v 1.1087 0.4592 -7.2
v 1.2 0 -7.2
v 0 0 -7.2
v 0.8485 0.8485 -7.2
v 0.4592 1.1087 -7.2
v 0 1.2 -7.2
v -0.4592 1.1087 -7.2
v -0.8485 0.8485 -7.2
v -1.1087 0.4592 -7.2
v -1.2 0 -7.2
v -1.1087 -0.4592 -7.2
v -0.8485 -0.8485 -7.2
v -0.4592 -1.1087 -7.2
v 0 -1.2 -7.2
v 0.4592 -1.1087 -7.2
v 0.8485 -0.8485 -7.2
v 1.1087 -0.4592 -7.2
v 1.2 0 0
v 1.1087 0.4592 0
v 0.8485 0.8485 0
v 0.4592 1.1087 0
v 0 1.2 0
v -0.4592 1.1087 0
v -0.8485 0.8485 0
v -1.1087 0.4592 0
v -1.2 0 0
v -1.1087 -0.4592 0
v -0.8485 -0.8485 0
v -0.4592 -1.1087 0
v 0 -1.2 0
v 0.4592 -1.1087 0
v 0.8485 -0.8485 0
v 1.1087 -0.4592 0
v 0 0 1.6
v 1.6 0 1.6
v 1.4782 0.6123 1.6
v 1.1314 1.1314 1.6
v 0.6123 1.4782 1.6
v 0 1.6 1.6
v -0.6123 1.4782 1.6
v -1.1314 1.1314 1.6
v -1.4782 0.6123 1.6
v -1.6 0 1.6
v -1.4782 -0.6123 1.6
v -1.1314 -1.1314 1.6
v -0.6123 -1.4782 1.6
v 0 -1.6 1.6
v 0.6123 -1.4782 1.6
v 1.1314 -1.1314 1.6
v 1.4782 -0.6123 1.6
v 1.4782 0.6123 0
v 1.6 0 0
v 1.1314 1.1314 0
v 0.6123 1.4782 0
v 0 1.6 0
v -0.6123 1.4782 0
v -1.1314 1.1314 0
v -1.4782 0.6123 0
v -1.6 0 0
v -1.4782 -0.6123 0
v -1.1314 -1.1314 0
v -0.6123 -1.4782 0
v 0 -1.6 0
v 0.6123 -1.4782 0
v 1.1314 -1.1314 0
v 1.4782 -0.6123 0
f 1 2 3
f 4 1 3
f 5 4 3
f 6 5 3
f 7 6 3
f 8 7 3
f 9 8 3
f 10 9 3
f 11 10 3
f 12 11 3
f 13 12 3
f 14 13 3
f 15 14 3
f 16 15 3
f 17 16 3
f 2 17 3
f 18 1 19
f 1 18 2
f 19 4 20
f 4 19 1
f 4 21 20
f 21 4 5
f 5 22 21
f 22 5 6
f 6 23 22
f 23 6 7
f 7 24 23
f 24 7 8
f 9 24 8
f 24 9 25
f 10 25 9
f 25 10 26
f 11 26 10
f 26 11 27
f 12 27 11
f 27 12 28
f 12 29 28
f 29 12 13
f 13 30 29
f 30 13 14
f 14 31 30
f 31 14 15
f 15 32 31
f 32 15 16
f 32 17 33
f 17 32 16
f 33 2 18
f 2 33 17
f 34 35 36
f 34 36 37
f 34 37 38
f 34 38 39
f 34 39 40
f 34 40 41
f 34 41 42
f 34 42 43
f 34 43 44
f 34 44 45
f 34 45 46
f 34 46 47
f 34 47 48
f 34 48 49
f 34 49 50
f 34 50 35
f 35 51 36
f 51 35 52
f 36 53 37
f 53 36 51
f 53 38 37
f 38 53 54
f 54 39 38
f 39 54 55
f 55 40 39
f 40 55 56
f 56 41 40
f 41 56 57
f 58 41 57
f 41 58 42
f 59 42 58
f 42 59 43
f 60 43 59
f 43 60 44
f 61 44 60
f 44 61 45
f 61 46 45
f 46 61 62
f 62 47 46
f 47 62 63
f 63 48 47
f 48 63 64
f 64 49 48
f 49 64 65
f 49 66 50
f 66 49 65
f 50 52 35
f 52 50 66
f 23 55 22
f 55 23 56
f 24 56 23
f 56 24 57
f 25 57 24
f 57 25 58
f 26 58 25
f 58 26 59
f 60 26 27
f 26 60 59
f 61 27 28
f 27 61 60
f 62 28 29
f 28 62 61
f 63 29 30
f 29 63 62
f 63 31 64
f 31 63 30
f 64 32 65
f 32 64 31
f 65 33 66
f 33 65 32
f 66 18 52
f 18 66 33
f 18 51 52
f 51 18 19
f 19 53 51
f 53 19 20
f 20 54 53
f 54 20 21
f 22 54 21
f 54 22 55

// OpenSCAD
// file: ../p/4-4edge.scad
use <../lib.scad>
function ldraw_lib__4_4edge() = [
// 0 Circle 1.0
// 0 Name: 4-4edge.dat
// 0 Author: James Jessiman
// 0 !LDRAW_ORG Primitive UPDATE 2017-01
// 0 !LICENSE Licensed under CC BY 2.0 and CC BY 4.0 : see CAreadme.txt
// 
// 0 BFC CERTIFY CCW
  [0,"BFC","CERTIFY"],
  [0,"BFC","CCW"],
// 
// 0 !HISTORY 1998-12-15 [PTadmin] Official Update 1998-10
// 0 !HISTORY 2005-12-28 [PTadmin] Official Update 2005-01
// 0 !HISTORY 2007-06-24 [PTadmin] Header formatted for Contributor Agreement
// 0 !HISTORY 2008-07-01 [PTadmin] Official Update 2008-01
// 0 !HISTORY 2017-01-15 [Steffen] BFCed
// 0 !HISTORY 2017-12-30 [PTadmin] Official Update 2017-01
// 
// 
// 2 24 1 0 0 0.9239 0 0.3827
  [2,24,1,0,0,0.9239,0,0.3827],
// 2 24 0.9239 0 0.3827 0.7071 0 0.7071
  [2,24,0.9239,0,0.3827,0.7071,0,0.7071],
// 2 24 0.7071 0 0.7071 0.3827 0 0.9239
  [2,24,0.7071,0,0.7071,0.3827,0,0.9239],
// 2 24 0.3827 0 0.9239 0 0 1
  [2,24,0.3827,0,0.9239,0,0,1],
// 2 24 0 0 1 -0.3827 0 0.9239
  [2,24,0,0,1,-0.3827,0,0.9239],
// 2 24 -0.3827 0 0.9239 -0.7071 0 0.7071
  [2,24,-0.3827,0,0.9239,-0.7071,0,0.7071],
// 2 24 -0.7071 0 0.7071 -0.9239 0 0.3827
  [2,24,-0.7071,0,0.7071,-0.9239,0,0.3827],
// 2 24 -0.9239 0 0.3827 -1 0 -0
  [2,24,-0.9239,0,0.3827,-1,0,-0],
// 2 24 -1 0 -0 -0.9239 0 -0.3827
  [2,24,-1,0,-0,-0.9239,0,-0.3827],
// 2 24 -0.9239 0 -0.3827 -0.7071 0 -0.7071
  [2,24,-0.9239,0,-0.3827,-0.7071,0,-0.7071],
// 2 24 -0.7071 0 -0.7071 -0.3827 0 -0.9239
  [2,24,-0.7071,0,-0.7071,-0.3827,0,-0.9239],
// 2 24 -0.3827 0 -0.9239 0 0 -1
  [2,24,-0.3827,0,-0.9239,0,0,-1],
// 2 24 0 0 -1 0.3827 0 -0.9239
  [2,24,0,0,-1,0.3827,0,-0.9239],
// 2 24 0.3827 0 -0.9239 0.7071 0 -0.7071
  [2,24,0.3827,0,-0.9239,0.7071,0,-0.7071],
// 2 24 0.7071 0 -0.7071 0.9239 0 -0.3827
  [2,24,0.7071,0,-0.7071,0.9239,0,-0.3827],
// 2 24 0.9239 0 -0.3827 1 0 0
  [2,24,0.9239,0,-0.3827,1,0,0],
];
makepoly(ldraw_lib__4_4edge(), line=0.2);
// file: ../p/4-4disc.scad
use <../lib.scad>
function ldraw_lib__4_4disc() = [
// 0 Disc 1.0
// 0 Name: 4-4disc.dat
// 0 Author: James Jessiman
// 0 !LDRAW_ORG Primitive UPDATE 2002-02
// 0 !LICENSE Licensed under CC BY 2.0 and CC BY 4.0 : see CAreadme.txt
// 
// 0 BFC CERTIFY CCW
  [0,"BFC","CERTIFY"],
  [0,"BFC","CCW"],
// 
// 0 !HISTORY 1998-12-15 [PTadmin] Official Update 1998-10
// 0 !HISTORY 2002-03-23 [sbliss] Added BFC statement
// 0 !HISTORY 2002-04-25 [PTadmin] Official Update 2002-02
// 0 !HISTORY 2007-06-24 [PTadmin] Header formatted for Contributor Agreement
// 0 !HISTORY 2008-07-01 [PTadmin] Official Update 2008-01
// 
// 
// 3 16 0 0 0 1 0 0 0.9239 0 0.3827
  [3,16,0,0,0,1,0,0,0.9239,0,0.3827],
// 3 16 0 0 0 0.9239 0 0.3827 0.7071 0 0.7071
  [3,16,0,0,0,0.9239,0,0.3827,0.7071,0,0.7071],
// 3 16 0 0 0 0.7071 0 0.7071 0.3827 0 0.9239
  [3,16,0,0,0,0.7071,0,0.7071,0.3827,0,0.9239],
// 3 16 0 0 0 0.3827 0 0.9239 0 0 1
  [3,16,0,0,0,0.3827,0,0.9239,0,0,1],
// 3 16 0 0 0 0 0 1 -0.3827 0 0.9239
  [3,16,0,0,0,0,0,1,-0.3827,0,0.9239],
// 3 16 0 0 0 -0.3827 0 0.9239 -0.7071 0 0.7071
  [3,16,0,0,0,-0.3827,0,0.9239,-0.7071,0,0.7071],
// 3 16 0 0 0 -0.7071 0 0.7071 -0.9239 0 0.3827
  [3,16,0,0,0,-0.7071,0,0.7071,-0.9239,0,0.3827],
// 3 16 0 0 0 -0.9239 0 0.3827 -1 0 -0
  [3,16,0,0,0,-0.9239,0,0.3827,-1,0,-0],
// 3 16 0 0 0 -1 0 -0 -0.9239 0 -0.3827
  [3,16,0,0,0,-1,0,-0,-0.9239,0,-0.3827],
// 3 16 0 0 0 -0.9239 0 -0.3827 -0.7071 0 -0.7071
  [3,16,0,0,0,-0.9239,0,-0.3827,-0.7071,0,-0.7071],
// 3 16 0 0 0 -0.7071 0 -0.7071 -0.3827 0 -0.9239
  [3,16,0,0,0,-0.7071,0,-0.7071,-0.3827,0,-0.9239],
// 3 16 0 0 0 -0.3827 0 -0.9239 0 0 -1
  [3,16,0,0,0,-0.3827,0,-0.9239,0,0,-1],
// 3 16 0 0 0 0 0 -1 0.3827 0 -0.9239
  [3,16,0,0,0,0,0,-1,0.3827,0,-0.9239],
// 3 16 0 0 0 0.3827 0 -0.9239 0.7071 0 -0.7071
  [3,16,0,0,0,0.3827,0,-0.9239,0.7071,0,-0.7071],
// 3 16 0 0 0 0.7071 0 -0.7071 0.9239 0 -0.3827
  [3,16,0,0,0,0.7071,0,-0.7071,0.9239,0,-0.3827],
// 3 16 0 0 0 0.9239 0 -0.3827 1 0 0
  [3,16,0,0,0,0.9239,0,-0.3827,1,0,0],
// 0
];
makepoly(ldraw_lib__4_4disc(), line=0.2);
// file: ../p/4-4cyli.scad
use <../lib.scad>
function ldraw_lib__4_4cyli() = [
// 0 Cylinder 1.0
// 0 Name: 4-4cyli.dat
// 0 Author: James Jessiman
// 0 !LDRAW_ORG Primitive UPDATE 2005-01
// 0 !LICENSE Licensed under CC BY 2.0 and CC BY 4.0 : see CAreadme.txt
// 
// 0 BFC CERTIFY CCW
  [0,"BFC","CERTIFY"],
  [0,"BFC","CCW"],
// 
// 0 !HISTORY 1998-12-15 [PTadmin] Official Update 1998-10
// 0 !HISTORY 2002-03-23 [sbliss] Added BFC statement; merged headers from files in distributions LDraw 0.27 and Complete.
// 0 !HISTORY 2002-04-25 [PTadmin] Official Update 2002-02
// 0 !HISTORY 2004-12-14 [guyvivan] BFC CCW
// 0 !HISTORY 2005-12-28 [PTadmin] Official Update 2005-01
// 0 !HISTORY 2007-06-24 [PTadmin] Header formatted for Contributor Agreement
// 0 !HISTORY 2008-07-01 [PTadmin] Official Update 2008-01
// 
// 
// 4 16 1 1 0 0.9239 1 0.3827 0.9239 0 0.3827 1 0 0
  [4,16,1,1,0,0.9239,1,0.3827,0.9239,0,0.3827,1,0,0],
// 5 24 1 0 0 1 1 0 0.9239 0 0.3827 0.9239 0 -0.3827
  [5,24,1,0,0,1,1,0,0.9239,0,0.3827,0.9239,0,-0.3827],
// 4 16 0.9239 1 0.3827 0.7071 1 0.7071 0.7071 0 0.7071 0.9239 0 0.3827
  [4,16,0.9239,1,0.3827,0.7071,1,0.7071,0.7071,0,0.7071,0.9239,0,0.3827],
// 5 24 0.9239 0 0.3827 0.9239 1 0.3827 0.7071 0 0.7071 1 0 0
  [5,24,0.9239,0,0.3827,0.9239,1,0.3827,0.7071,0,0.7071,1,0,0],
// 4 16 0.7071 1 0.7071 0.3827 1 0.9239 0.3827 0 0.9239 0.7071 0 0.7071
  [4,16,0.7071,1,0.7071,0.3827,1,0.9239,0.3827,0,0.9239,0.7071,0,0.7071],
// 5 24 0.7071 0 0.7071 0.7071 1 0.7071 0.3827 0 0.9239 0.9239 0 0.3827
  [5,24,0.7071,0,0.7071,0.7071,1,0.7071,0.3827,0,0.9239,0.9239,0,0.3827],
// 4 16 0.3827 1 0.9239 0 1 1 0 0 1 0.3827 0 0.9239
  [4,16,0.3827,1,0.9239,0,1,1,0,0,1,0.3827,0,0.9239],
// 5 24 0.3827 0 0.9239 0.3827 1 0.9239 0 0 1 0.7071 0 0.7071
  [5,24,0.3827,0,0.9239,0.3827,1,0.9239,0,0,1,0.7071,0,0.7071],
// 4 16 0 1 1 -0.3827 1 0.9239 -0.3827 0 0.9239 0 0 1
  [4,16,0,1,1,-0.3827,1,0.9239,-0.3827,0,0.9239,0,0,1],
// 5 24 0 0 1 0 1 1 -0.3827 0 0.9239 0.3827 0 0.9239
  [5,24,0,0,1,0,1,1,-0.3827,0,0.9239,0.3827,0,0.9239],
// 4 16 -0.3827 1 0.9239 -0.7071 1 0.7071 -0.7071 0 0.7071 -0.3827 0 0.9239
  [4,16,-0.3827,1,0.9239,-0.7071,1,0.7071,-0.7071,0,0.7071,-0.3827,0,0.9239],
// 5 24 -0.3827 0 0.9239 -0.3827 1 0.9239 -0.7071 0 0.7071 0 0 1
  [5,24,-0.3827,0,0.9239,-0.3827,1,0.9239,-0.7071,0,0.7071,0,0,1],
// 4 16 -0.7071 1 0.7071 -0.9239 1 0.3827 -0.9239 0 0.3827 -0.7071 0 0.7071
  [4,16,-0.7071,1,0.7071,-0.9239,1,0.3827,-0.9239,0,0.3827,-0.7071,0,0.7071],
// 5 24 -0.7071 0 0.7071 -0.7071 1 0.7071 -0.9239 0 0.3827 -0.3827 0 0.9239
  [5,24,-0.7071,0,0.7071,-0.7071,1,0.7071,-0.9239,0,0.3827,-0.3827,0,0.9239],
// 4 16 -0.9239 1 0.3827 -1 1 0 -1 0 0 -0.9239 0 0.3827
  [4,16,-0.9239,1,0.3827,-1,1,0,-1,0,0,-0.9239,0,0.3827],
// 5 24 -0.9239 0 0.3827 -0.9239 1 0.3827 -1 0 0 -0.7071 0 0.7071
  [5,24,-0.9239,0,0.3827,-0.9239,1,0.3827,-1,0,0,-0.7071,0,0.7071],
// 4 16 -1 1 0 -0.9239 1 -0.3827 -0.9239 0 -0.3827 -1 0 0
  [4,16,-1,1,0,-0.9239,1,-0.3827,-0.9239,0,-0.3827,-1,0,0],
// 5 24 -1 0 0 -1 1 0 -0.9239 0 -0.3827 -0.9239 0 0.3827
  [5,24,-1,0,0,-1,1,0,-0.9239,0,-0.3827,-0.9239,0,0.3827],
// 4 16 -0.9239 1 -0.3827 -0.7071 1 -0.7071 -0.7071 0 -0.7071 -0.9239 0 -0.3827
  [4,16,-0.9239,1,-0.3827,-0.7071,1,-0.7071,-0.7071,0,-0.7071,-0.9239,0,-0.3827],
// 5 24 -0.9239 0 -0.3827 -0.9239 1 -0.3827 -0.7071 0 -0.7071 -1 0 0
  [5,24,-0.9239,0,-0.3827,-0.9239,1,-0.3827,-0.7071,0,-0.7071,-1,0,0],
// 4 16 -0.7071 1 -0.7071 -0.3827 1 -0.9239 -0.3827 0 -0.9239 -0.7071 0 -0.7071
  [4,16,-0.7071,1,-0.7071,-0.3827,1,-0.9239,-0.3827,0,-0.9239,-0.7071,0,-0.7071],
// 5 24 -0.7071 0 -0.7071 -0.7071 1 -0.7071 -0.3827 0 -0.9239 -0.9239 0 -0.3827
  [5,24,-0.7071,0,-0.7071,-0.7071,1,-0.7071,-0.3827,0,-0.9239,-0.9239,0,-0.3827],
// 4 16 -0.3827 1 -0.9239 0 1 -1 0 0 -1 -0.3827 0 -0.9239
  [4,16,-0.3827,1,-0.9239,0,1,-1,0,0,-1,-0.3827,0,-0.9239],
// 5 24 -0.3827 0 -0.9239 -0.3827 1 -0.9239 0 0 -1 -0.7071 0 -0.7071
  [5,24,-0.3827,0,-0.9239,-0.3827,1,-0.9239,0,0,-1,-0.7071,0,-0.7071],
// 4 16 0 1 -1 0.3827 1 -0.9239 0.3827 0 -0.9239 0 0 -1
  [4,16,0,1,-1,0.3827,1,-0.9239,0.3827,0,-0.9239,0,0,-1],
// 5 24 0 0 -1 0 1 -1 0.3827 0 -0.9239 -0.3827 0 -0.9239
  [5,24,0,0,-1,0,1,-1,0.3827,0,-0.9239,-0.3827,0,-0.9239],
// 4 16 0.3827 1 -0.9239 0.7071 1 -0.7071 0.7071 0 -0.7071 0.3827 0 -0.9239
  [4,16,0.3827,1,-0.9239,0.7071,1,-0.7071,0.7071,0,-0.7071,0.3827,0,-0.9239],
// 5 24 0.3827 0 -0.9239 0.3827 1 -0.9239 0.7071 0 -0.7071 0 0 -1
  [5,24,0.3827,0,-0.9239,0.3827,1,-0.9239,0.7071,0,-0.7071,0,0,-1],
// 4 16 0.7071 1 -0.7071 0.9239 1 -0.3827 0.9239 0 -0.3827 0.7071 0 -0.7071
  [4,16,0.7071,1,-0.7071,0.9239,1,-0.3827,0.9239,0,-0.3827,0.7071,0,-0.7071],
// 5 24 0.7071 0 -0.7071 0.7071 1 -0.7071 0.9239 0 -0.3827 0.3827 0 -0.9239
  [5,24,0.7071,0,-0.7071,0.7071,1,-0.7071,0.9239,0,-0.3827,0.3827,0,-0.9239],
// 4 16 0.9239 1 -0.3827 1 1 0 1 0 0 0.9239 0 -0.3827
  [4,16,0.9239,1,-0.3827,1,1,0,1,0,0,0.9239,0,-0.3827],
// 5 24 0.9239 0 -0.3827 0.9239 1 -0.3827 1 0 0 0.7071 0 -0.7071
  [5,24,0.9239,0,-0.3827,0.9239,1,-0.3827,1,0,0,0.7071,0,-0.7071],
// 0
];
makepoly(ldraw_lib__4_4cyli(), line=0.2);
// file: ../p/4-4ring3.scad
use <../lib.scad>
function ldraw_lib__4_4ring3() = [
// 0 Ring  3 x 1.0
// 0 Name: 4-4ring3.dat
// 0 Author: James Jessiman
// 0 !LDRAW_ORG Primitive UPDATE 2009-01
// 0 !LICENSE Licensed under CC BY 2.0 and CC BY 4.0 : see CAreadme.txt
// 
// 0 BFC CERTIFY CCW
  [0,"BFC","CERTIFY"],
  [0,"BFC","CCW"],
// 
// 0 !HISTORY 1998-12-15 [PTadmin] Official Update 1998-10
// 0 !HISTORY 2002-04-05 [hafhead] Added BFC statement
// 0 !HISTORY 2002-04-25 [PTadmin] Official Update 2002-02
// 0 !HISTORY 2007-06-24 [PTadmin] Header formatted for Contributor Agreement
// 0 !HISTORY 2008-07-01 [PTadmin] Official Update 2008-01
// 0 !HISTORY 2008-08-26 [cwdee] Switch polygon winding and rename
// 0 !HISTORY 2009-05-02 [PTadmin] Official Update 2009-01
// 
// 
// 4 16 -1.5308 0 3.6956 -1.1481 0 2.7717 0 0 3 0 0 4
  [4,16,-1.5308,0,3.6956,-1.1481,0,2.7717,0,0,3,0,0,4],
// 4 16 -2.8284 0 2.8284 -2.1213 0 2.1213 -1.1481 0 2.7717 -1.5308 0 3.6956
  [4,16,-2.8284,0,2.8284,-2.1213,0,2.1213,-1.1481,0,2.7717,-1.5308,0,3.6956],
// 4 16 -3.6956 0 1.5308 -2.7717 0 1.1481 -2.1213 0 2.1213 -2.8284 0 2.8284
  [4,16,-3.6956,0,1.5308,-2.7717,0,1.1481,-2.1213,0,2.1213,-2.8284,0,2.8284],
// 4 16 -4 0 0 -3 0 0 -2.7717 0 1.1481 -3.6956 0 1.5308
  [4,16,-4,0,0,-3,0,0,-2.7717,0,1.1481,-3.6956,0,1.5308],
// 4 16 -3.6956 0 -1.5308 -2.7717 0 -1.1481 -3 0 0 -4 0 0
  [4,16,-3.6956,0,-1.5308,-2.7717,0,-1.1481,-3,0,0,-4,0,0],
// 4 16 -2.8284 0 -2.8284 -2.1213 0 -2.1213 -2.7717 0 -1.1481 -3.6956 0 -1.5308
  [4,16,-2.8284,0,-2.8284,-2.1213,0,-2.1213,-2.7717,0,-1.1481,-3.6956,0,-1.5308],
// 4 16 -1.5308 0 -3.6956 -1.1481 0 -2.7717 -2.1213 0 -2.1213 -2.8284 0 -2.8284
  [4,16,-1.5308,0,-3.6956,-1.1481,0,-2.7717,-2.1213,0,-2.1213,-2.8284,0,-2.8284],
// 4 16 0 0 -4 0 0 -3 -1.1481 0 -2.7717 -1.5308 0 -3.6956
  [4,16,0,0,-4,0,0,-3,-1.1481,0,-2.7717,-1.5308,0,-3.6956],
// 4 16 1.5308 0 -3.6956 1.1481 0 -2.7717 0 0 -3 0 0 -4
  [4,16,1.5308,0,-3.6956,1.1481,0,-2.7717,0,0,-3,0,0,-4],
// 4 16 2.8284 0 -2.8284 2.1213 0 -2.1213 1.1481 0 -2.7717 1.5308 0 -3.6956
  [4,16,2.8284,0,-2.8284,2.1213,0,-2.1213,1.1481,0,-2.7717,1.5308,0,-3.6956],
// 4 16 3.6956 0 -1.5308 2.7717 0 -1.1481 2.1213 0 -2.1213 2.8284 0 -2.8284
  [4,16,3.6956,0,-1.5308,2.7717,0,-1.1481,2.1213,0,-2.1213,2.8284,0,-2.8284],
// 4 16 4 0 0 3 0 0 2.7717 0 -1.1481 3.6956 0 -1.5308
  [4,16,4,0,0,3,0,0,2.7717,0,-1.1481,3.6956,0,-1.5308],
// 4 16 3.6956 0 1.5308 2.7717 0 1.1481 3 0 0 4 0 0
  [4,16,3.6956,0,1.5308,2.7717,0,1.1481,3,0,0,4,0,0],
// 4 16 2.8284 0 2.8284 2.1213 0 2.1213 2.7717 0 1.1481 3.6956 0 1.5308
  [4,16,2.8284,0,2.8284,2.1213,0,2.1213,2.7717,0,1.1481,3.6956,0,1.5308],
// 4 16 1.5308 0 3.6956 1.1481 0 2.7717 2.1213 0 2.1213 2.8284 0 2.8284
  [4,16,1.5308,0,3.6956,1.1481,0,2.7717,2.1213,0,2.1213,2.8284,0,2.8284],
// 4 16 0 0 4 0 0 3 1.1481 0 2.7717 1.5308 0 3.6956
  [4,16,0,0,4,0,0,3,1.1481,0,2.7717,1.5308,0,3.6956],
// 0
];
makepoly(ldraw_lib__4_4ring3(), line=0.2);
// file: ../p/4-4cylc.scad
use <../lib.scad>
use <4-4cyli.scad>
use <4-4disc.scad>
use <4-4edge.scad>
function ldraw_lib__4_4cylc() = [
// 0 Cylinder Closed 1.0
// 0 Name: 4-4cylc.dat
// 0 Author: Alex Taylor [anathema]
// 0 !LDRAW_ORG Primitive UPDATE 2009-02
// 0 !LICENSE Licensed under CC BY 2.0 and CC BY 4.0 : see CAreadme.txt
// 
// 0 BFC CERTIFY CCW
  [0,"BFC","CERTIFY"],
  [0,"BFC","CCW"],
// 
// 0 !HISTORY 2008-12-29 [cwdee] Removed one disc
// 0 !HISTORY 2009-09-03 [PTadmin] Official Update 2009-02
// 
// 
// 1 16 0 0 0 1 0 0 0 1 0 0 0 1 4-4edge.dat
  [1,16,0,0,0,1,0,0,0,1,0,0,0,1, ldraw_lib__4_4edge()],
// 1 16 0 1 0 1 0 0 0 1 0 0 0 1 4-4edge.dat
  [1,16,0,1,0,1,0,0,0,1,0,0,0,1, ldraw_lib__4_4edge()],
// 1 16 0 0 0 1 0 0 0 1 0 0 0 1 4-4disc.dat
  [1,16,0,0,0,1,0,0,0,1,0,0,0,1, ldraw_lib__4_4disc()],
// 1 16 0 0 0 1 0 0 0 1 0 0 0 1 4-4cyli.dat
  [1,16,0,0,0,1,0,0,0,1,0,0,0,1, ldraw_lib__4_4cyli()],
// 0
];
makepoly(ldraw_lib__4_4cylc(), line=0.2);
// main file
use <../lib.scad>
use <../p/4-4cylc.scad>
use <../p/4-4ring3.scad>
function ldraw_lib__u9208() = [
// 0 ~Electric Mindstorms EV3 Rechargeable Battery Assembly Pin
// 0 Name: u9208.dat
// 0 Author: Philippe Hurbain [Philo]
// 0 !LDRAW_ORG Part UPDATE 2013-02
// 0 !LICENSE Licensed under CC BY 2.0 and CC BY 4.0 : see CAreadme.txt
// 
// 0 BFC CERTIFY CCW
  [0,"BFC","CERTIFY"],
  [0,"BFC","CCW"],
// 
// 0 !HISTORY 2013-12-23 [PTadmin] Official Update 2013-02
// 
// 
// 1 16 0 18 0 3 0 0 0 -18 0 0 0 3 4-4cylc.dat
  [1,16,0,18,0,3,0,0,0,-18,0,0,0,3, ldraw_lib__4_4cylc()],
// 1 16 0 -4 0 4 0 0 0 4 0 0 0 4 4-4cylc.dat
  [1,16,0,-4,0,4,0,0,0,4,0,0,0,4, ldraw_lib__4_4cylc()],
// 1 16 0 0 0 1 0 0 0 -1 0 0 0 1 4-4ring3.dat
  [1,16,0,0,0,1,0,0,0,-1,0,0,0,1, ldraw_lib__4_4ring3()],
];
makepoly(ldraw_lib__u9208(), line=0.2);
